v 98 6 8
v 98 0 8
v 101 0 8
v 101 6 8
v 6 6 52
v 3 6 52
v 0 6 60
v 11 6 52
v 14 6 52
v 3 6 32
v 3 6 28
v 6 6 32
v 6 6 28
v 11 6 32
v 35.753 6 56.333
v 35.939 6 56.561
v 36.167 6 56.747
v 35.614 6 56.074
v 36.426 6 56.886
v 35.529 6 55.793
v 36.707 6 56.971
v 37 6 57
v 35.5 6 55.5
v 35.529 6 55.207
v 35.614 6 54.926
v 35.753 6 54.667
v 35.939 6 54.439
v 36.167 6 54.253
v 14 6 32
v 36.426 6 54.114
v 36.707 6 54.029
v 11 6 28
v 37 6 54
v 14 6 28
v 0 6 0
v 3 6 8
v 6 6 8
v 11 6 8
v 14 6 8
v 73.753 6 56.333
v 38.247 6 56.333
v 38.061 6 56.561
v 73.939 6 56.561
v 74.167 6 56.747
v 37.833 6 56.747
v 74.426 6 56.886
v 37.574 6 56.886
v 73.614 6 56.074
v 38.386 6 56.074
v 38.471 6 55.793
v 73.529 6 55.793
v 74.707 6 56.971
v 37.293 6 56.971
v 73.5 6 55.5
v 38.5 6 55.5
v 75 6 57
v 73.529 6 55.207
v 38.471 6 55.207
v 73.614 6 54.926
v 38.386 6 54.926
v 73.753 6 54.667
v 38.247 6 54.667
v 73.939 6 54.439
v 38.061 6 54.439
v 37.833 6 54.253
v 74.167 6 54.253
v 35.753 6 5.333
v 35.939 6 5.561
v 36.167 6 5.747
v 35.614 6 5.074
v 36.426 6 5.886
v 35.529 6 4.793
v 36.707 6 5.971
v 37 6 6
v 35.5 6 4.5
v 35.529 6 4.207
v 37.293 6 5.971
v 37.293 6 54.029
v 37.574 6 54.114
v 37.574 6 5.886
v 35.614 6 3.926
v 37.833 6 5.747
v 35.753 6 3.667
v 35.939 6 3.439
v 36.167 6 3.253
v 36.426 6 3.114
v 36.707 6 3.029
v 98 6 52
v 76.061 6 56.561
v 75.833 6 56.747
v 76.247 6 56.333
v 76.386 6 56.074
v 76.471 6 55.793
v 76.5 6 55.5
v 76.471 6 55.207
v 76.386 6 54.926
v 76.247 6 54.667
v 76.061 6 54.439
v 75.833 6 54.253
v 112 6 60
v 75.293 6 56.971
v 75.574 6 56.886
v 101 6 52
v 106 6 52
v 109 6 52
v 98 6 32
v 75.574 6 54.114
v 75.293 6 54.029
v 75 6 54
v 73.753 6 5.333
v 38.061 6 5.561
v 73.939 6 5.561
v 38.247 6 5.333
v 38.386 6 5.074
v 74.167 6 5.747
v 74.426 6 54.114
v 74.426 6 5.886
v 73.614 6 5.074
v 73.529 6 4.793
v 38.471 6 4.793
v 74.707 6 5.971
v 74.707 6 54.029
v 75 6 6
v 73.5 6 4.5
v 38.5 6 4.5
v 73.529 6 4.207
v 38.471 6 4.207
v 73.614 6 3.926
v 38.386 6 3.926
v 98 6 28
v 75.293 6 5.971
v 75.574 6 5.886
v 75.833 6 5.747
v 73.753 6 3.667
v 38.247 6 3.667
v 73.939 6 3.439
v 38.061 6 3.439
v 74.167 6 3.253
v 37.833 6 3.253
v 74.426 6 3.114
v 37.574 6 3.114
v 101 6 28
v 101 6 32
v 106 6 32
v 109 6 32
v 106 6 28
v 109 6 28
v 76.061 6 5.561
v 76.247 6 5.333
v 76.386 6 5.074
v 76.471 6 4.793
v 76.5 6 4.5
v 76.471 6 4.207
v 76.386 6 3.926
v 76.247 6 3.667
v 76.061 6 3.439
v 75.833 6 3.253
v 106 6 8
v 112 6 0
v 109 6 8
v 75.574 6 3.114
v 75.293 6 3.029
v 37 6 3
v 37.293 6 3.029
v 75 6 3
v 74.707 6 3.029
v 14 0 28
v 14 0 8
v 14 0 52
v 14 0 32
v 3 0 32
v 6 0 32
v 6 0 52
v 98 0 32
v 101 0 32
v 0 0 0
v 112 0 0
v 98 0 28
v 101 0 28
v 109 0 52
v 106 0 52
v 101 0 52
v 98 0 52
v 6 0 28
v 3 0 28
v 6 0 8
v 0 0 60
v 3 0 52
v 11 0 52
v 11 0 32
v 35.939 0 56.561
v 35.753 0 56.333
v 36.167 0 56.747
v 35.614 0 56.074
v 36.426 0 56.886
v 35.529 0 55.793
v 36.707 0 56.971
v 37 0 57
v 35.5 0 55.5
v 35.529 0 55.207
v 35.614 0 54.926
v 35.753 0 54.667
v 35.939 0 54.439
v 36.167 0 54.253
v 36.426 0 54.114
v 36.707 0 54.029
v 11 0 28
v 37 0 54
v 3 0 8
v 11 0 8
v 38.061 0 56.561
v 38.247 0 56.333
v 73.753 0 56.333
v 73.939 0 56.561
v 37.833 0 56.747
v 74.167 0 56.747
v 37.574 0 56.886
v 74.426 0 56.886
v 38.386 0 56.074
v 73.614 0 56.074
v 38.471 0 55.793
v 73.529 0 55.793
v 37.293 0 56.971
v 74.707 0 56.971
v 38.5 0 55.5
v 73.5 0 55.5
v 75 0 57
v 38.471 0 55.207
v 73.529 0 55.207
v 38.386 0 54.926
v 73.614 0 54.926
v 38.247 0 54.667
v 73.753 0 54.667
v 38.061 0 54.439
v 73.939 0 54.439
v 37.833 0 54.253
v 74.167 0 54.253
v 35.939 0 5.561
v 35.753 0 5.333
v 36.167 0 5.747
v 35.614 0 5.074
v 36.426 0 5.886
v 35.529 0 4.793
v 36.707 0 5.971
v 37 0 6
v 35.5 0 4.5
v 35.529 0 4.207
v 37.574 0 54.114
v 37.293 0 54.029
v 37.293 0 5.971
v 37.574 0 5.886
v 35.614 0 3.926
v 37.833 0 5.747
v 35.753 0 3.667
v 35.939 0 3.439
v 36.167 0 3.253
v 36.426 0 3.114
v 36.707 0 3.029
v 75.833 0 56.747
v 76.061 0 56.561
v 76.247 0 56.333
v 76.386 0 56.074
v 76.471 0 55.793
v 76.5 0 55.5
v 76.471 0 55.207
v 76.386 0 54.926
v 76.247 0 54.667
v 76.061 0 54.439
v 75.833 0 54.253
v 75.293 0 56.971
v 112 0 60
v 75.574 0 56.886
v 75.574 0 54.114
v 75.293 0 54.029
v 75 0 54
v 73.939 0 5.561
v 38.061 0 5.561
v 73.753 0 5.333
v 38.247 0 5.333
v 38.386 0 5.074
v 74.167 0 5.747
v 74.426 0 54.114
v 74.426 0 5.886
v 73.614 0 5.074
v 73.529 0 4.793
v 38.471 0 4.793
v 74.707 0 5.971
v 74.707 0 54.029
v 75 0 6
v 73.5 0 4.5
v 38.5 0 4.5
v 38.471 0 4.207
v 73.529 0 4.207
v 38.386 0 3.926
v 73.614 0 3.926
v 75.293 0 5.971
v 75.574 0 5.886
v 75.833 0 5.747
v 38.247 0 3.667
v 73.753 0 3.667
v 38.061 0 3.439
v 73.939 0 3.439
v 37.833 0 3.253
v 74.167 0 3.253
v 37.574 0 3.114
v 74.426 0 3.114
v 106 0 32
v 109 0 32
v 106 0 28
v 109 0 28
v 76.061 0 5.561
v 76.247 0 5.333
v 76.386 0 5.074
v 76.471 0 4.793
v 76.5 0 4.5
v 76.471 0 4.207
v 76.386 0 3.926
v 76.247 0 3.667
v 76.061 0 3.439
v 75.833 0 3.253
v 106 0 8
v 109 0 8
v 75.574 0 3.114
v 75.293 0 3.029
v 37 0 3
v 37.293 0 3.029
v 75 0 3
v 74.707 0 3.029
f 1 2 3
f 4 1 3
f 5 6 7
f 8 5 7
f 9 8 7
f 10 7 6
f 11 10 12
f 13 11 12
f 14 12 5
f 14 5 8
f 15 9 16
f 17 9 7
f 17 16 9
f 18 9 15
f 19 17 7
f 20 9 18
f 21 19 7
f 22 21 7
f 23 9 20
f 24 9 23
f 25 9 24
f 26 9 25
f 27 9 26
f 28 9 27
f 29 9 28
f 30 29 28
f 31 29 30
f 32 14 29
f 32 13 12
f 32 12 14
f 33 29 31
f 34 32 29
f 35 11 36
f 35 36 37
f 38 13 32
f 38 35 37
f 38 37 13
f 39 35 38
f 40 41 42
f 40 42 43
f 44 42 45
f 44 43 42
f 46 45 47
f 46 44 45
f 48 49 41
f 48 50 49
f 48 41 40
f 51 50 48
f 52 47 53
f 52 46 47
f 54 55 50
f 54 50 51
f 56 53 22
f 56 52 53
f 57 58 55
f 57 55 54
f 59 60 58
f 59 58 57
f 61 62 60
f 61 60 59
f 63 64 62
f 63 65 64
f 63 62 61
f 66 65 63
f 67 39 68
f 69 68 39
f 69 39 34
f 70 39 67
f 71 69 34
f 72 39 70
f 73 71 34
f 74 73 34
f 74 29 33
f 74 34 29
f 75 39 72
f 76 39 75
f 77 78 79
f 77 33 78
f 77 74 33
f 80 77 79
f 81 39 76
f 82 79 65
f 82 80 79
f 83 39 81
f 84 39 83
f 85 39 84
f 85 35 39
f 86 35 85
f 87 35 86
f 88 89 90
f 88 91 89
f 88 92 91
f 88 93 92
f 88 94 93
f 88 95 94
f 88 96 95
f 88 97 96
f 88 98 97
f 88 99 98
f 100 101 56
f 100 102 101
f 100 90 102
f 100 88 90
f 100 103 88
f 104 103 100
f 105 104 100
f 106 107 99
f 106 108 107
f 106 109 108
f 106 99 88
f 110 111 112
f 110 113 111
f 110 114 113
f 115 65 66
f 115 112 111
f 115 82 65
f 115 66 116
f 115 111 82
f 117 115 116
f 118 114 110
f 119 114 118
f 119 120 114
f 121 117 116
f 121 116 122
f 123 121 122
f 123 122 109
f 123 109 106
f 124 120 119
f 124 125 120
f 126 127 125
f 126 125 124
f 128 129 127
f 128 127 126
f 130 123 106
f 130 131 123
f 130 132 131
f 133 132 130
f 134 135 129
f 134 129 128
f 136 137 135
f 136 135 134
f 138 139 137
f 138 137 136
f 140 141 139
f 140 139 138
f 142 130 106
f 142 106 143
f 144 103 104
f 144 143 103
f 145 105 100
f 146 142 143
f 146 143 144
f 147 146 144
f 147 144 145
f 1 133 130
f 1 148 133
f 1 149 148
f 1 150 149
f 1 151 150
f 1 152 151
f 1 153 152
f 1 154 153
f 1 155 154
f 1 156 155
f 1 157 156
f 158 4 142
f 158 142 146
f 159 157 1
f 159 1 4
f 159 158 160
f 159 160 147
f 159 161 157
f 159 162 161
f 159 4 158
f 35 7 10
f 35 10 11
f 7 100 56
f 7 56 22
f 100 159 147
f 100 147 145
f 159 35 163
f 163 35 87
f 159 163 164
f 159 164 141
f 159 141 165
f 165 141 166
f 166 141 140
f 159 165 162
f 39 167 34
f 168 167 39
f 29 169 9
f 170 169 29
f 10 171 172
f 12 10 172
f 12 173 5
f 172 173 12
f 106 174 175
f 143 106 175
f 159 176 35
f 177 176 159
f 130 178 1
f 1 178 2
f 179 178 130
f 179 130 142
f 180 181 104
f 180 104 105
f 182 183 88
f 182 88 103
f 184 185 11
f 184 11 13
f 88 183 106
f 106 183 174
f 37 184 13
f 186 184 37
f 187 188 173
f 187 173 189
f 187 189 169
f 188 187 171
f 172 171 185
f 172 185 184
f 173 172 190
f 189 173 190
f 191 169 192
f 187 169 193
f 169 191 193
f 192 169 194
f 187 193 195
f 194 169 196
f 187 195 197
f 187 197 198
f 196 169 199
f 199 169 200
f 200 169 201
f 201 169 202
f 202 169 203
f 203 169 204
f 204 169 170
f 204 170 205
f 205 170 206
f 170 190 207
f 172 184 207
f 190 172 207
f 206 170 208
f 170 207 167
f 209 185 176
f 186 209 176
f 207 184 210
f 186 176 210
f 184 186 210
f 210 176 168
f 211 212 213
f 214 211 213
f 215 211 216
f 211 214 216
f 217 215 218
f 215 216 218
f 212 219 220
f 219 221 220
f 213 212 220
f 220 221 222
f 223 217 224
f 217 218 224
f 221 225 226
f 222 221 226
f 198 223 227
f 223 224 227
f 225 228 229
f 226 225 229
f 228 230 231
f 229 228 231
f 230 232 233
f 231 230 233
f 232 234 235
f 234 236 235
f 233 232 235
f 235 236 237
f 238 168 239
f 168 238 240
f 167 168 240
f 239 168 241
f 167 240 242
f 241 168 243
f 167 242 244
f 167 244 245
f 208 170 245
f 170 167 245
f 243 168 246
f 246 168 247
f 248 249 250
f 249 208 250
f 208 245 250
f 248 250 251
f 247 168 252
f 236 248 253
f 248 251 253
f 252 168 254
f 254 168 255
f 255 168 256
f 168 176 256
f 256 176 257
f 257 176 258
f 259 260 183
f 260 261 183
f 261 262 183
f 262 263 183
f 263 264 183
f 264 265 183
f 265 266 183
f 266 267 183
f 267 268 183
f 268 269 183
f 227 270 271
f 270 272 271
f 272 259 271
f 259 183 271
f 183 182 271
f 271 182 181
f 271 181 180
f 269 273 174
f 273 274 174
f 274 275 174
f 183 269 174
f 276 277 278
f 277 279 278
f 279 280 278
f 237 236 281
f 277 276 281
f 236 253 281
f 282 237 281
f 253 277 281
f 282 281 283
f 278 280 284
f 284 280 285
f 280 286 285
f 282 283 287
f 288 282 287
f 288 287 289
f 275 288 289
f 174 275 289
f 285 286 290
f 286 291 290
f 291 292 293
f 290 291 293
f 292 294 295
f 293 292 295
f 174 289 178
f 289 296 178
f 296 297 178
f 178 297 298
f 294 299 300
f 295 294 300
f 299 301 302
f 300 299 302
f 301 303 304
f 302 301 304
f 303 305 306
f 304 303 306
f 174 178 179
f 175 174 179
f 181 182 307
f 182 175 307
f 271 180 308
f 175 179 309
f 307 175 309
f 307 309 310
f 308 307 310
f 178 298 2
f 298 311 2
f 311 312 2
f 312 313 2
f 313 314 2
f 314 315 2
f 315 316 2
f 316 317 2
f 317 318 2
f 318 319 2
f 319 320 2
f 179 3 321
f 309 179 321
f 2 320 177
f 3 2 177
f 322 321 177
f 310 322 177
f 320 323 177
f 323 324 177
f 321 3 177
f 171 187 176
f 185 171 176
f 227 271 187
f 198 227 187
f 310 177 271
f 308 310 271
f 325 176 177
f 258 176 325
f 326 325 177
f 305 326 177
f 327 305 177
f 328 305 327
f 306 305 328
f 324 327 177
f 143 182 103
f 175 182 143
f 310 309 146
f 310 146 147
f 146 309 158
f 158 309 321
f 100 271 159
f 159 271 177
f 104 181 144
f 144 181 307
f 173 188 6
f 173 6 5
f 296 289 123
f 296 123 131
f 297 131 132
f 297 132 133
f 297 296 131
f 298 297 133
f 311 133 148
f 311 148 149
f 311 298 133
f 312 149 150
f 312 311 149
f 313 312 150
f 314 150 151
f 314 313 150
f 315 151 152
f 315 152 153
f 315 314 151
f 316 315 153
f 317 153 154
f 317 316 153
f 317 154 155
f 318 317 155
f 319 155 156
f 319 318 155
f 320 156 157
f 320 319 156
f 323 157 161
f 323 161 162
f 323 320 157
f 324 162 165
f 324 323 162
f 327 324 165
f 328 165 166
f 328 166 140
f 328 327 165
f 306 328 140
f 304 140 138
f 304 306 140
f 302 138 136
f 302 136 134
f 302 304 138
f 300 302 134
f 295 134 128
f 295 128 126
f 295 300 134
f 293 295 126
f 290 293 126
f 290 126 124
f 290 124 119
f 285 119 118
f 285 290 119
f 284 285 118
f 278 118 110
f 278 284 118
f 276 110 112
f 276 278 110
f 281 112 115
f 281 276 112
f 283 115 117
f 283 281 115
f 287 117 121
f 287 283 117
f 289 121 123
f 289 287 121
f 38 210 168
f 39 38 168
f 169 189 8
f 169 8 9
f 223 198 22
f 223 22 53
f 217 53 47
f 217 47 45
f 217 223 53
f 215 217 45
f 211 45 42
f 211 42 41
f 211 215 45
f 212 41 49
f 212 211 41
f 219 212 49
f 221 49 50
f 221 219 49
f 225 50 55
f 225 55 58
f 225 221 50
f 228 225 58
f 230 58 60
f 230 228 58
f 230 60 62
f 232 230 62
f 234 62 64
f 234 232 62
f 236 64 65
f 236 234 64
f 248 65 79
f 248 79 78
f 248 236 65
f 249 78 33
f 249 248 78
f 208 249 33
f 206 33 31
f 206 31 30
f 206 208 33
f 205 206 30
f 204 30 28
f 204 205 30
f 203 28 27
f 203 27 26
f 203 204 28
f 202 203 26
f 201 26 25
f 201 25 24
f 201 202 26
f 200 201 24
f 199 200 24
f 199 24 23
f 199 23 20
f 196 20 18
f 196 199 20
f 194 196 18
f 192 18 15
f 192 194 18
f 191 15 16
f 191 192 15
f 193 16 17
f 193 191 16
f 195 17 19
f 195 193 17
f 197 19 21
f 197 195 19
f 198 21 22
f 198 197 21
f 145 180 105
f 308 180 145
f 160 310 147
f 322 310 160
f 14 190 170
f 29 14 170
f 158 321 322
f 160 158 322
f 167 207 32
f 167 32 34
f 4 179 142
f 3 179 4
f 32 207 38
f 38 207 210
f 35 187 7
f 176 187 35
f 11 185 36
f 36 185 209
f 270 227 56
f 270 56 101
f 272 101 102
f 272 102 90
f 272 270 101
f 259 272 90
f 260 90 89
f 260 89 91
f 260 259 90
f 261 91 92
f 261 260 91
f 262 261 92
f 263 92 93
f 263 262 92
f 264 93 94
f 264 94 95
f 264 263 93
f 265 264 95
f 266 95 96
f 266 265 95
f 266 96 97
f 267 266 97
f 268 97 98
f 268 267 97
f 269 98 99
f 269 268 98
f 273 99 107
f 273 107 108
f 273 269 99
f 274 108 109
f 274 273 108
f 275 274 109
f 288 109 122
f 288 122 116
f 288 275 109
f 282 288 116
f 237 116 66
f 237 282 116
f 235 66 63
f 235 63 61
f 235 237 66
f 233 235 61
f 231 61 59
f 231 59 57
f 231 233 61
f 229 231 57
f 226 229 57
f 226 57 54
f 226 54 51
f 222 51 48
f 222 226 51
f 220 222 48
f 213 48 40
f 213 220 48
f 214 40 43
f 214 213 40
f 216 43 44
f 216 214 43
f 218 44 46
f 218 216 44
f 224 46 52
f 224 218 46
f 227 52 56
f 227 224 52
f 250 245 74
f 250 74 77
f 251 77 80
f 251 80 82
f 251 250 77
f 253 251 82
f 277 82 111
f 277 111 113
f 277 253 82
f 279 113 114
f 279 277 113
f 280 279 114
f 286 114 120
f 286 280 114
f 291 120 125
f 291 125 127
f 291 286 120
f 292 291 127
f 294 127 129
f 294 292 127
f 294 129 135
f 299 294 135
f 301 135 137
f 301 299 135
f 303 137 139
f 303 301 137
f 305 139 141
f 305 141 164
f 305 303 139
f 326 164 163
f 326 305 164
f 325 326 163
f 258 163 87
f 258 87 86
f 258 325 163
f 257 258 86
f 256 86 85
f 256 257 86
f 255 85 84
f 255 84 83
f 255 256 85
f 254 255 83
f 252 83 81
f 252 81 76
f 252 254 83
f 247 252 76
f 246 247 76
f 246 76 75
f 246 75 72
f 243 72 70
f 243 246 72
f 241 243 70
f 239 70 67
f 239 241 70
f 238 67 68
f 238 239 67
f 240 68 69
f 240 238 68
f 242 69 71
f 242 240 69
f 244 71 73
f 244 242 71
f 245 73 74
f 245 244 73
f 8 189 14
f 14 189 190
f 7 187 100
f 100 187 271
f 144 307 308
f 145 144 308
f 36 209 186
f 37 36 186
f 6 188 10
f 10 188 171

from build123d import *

# Parameters (mm, degrees)
SKETCH_1_W      = 112
SKETCH_1_H      = 60
SKETCH_1_R      = 1.5
SKETCH_1_W_2    = 3
SKETCH_1_H_2    = 20
EXTRUDE_1_DEPTH = 6


with BuildPart() as part:
    # 草图1 → 凸台-拉伸1 (new body)
    with BuildSketch(Plane(origin=(0, 0, 0), x_dir=(1, 0, 0), z_dir=(0, 1, 0))):
        with Locations((56, -30)):
            Rectangle(SKETCH_1_W, SKETCH_1_H)
        with Locations(Location((75, -4.5, 0), (0, 0, 270))):
            Circle(SKETCH_1_R, mode=Mode.SUBTRACT)
        with Locations(Location((37, -4.5, 0), (0, 0, 270))):
            Circle(SKETCH_1_R, mode=Mode.SUBTRACT)
        with Locations(Location((75, -55.5, 0), (0, 0, 270))):
            Circle(SKETCH_1_R, mode=Mode.SUBTRACT)
        with Locations(Location((37, -55.5, 0), (0, 0, 270))):
            Circle(SKETCH_1_R, mode=Mode.SUBTRACT)
        with Locations((4.5, -18)):
            Rectangle(SKETCH_1_W_2, SKETCH_1_H_2, mode=Mode.SUBTRACT)
        with Locations((4.5, -42)):
            Rectangle(SKETCH_1_W_2, SKETCH_1_H_2, mode=Mode.SUBTRACT)
        with Locations((107.5, -18)):
            Rectangle(SKETCH_1_W_2, SKETCH_1_H_2, mode=Mode.SUBTRACT)
        with Locations((107.5, -42)):
            Rectangle(SKETCH_1_W_2, SKETCH_1_H_2, mode=Mode.SUBTRACT)
        with Locations((12.5, -42)):
            Rectangle(SKETCH_1_W_2, SKETCH_1_H_2, mode=Mode.SUBTRACT)
        with Locations((12.5, -18)):
            Rectangle(SKETCH_1_W_2, SKETCH_1_H_2, mode=Mode.SUBTRACT)
        with Locations((99.5, -18)):
            Rectangle(SKETCH_1_W_2, SKETCH_1_H_2, mode=Mode.SUBTRACT)
        with Locations((99.5, -42)):
            Rectangle(SKETCH_1_W_2, SKETCH_1_H_2, mode=Mode.SUBTRACT)
    extrude(amount=EXTRUDE_1_DEPTH)


solid = part.part
